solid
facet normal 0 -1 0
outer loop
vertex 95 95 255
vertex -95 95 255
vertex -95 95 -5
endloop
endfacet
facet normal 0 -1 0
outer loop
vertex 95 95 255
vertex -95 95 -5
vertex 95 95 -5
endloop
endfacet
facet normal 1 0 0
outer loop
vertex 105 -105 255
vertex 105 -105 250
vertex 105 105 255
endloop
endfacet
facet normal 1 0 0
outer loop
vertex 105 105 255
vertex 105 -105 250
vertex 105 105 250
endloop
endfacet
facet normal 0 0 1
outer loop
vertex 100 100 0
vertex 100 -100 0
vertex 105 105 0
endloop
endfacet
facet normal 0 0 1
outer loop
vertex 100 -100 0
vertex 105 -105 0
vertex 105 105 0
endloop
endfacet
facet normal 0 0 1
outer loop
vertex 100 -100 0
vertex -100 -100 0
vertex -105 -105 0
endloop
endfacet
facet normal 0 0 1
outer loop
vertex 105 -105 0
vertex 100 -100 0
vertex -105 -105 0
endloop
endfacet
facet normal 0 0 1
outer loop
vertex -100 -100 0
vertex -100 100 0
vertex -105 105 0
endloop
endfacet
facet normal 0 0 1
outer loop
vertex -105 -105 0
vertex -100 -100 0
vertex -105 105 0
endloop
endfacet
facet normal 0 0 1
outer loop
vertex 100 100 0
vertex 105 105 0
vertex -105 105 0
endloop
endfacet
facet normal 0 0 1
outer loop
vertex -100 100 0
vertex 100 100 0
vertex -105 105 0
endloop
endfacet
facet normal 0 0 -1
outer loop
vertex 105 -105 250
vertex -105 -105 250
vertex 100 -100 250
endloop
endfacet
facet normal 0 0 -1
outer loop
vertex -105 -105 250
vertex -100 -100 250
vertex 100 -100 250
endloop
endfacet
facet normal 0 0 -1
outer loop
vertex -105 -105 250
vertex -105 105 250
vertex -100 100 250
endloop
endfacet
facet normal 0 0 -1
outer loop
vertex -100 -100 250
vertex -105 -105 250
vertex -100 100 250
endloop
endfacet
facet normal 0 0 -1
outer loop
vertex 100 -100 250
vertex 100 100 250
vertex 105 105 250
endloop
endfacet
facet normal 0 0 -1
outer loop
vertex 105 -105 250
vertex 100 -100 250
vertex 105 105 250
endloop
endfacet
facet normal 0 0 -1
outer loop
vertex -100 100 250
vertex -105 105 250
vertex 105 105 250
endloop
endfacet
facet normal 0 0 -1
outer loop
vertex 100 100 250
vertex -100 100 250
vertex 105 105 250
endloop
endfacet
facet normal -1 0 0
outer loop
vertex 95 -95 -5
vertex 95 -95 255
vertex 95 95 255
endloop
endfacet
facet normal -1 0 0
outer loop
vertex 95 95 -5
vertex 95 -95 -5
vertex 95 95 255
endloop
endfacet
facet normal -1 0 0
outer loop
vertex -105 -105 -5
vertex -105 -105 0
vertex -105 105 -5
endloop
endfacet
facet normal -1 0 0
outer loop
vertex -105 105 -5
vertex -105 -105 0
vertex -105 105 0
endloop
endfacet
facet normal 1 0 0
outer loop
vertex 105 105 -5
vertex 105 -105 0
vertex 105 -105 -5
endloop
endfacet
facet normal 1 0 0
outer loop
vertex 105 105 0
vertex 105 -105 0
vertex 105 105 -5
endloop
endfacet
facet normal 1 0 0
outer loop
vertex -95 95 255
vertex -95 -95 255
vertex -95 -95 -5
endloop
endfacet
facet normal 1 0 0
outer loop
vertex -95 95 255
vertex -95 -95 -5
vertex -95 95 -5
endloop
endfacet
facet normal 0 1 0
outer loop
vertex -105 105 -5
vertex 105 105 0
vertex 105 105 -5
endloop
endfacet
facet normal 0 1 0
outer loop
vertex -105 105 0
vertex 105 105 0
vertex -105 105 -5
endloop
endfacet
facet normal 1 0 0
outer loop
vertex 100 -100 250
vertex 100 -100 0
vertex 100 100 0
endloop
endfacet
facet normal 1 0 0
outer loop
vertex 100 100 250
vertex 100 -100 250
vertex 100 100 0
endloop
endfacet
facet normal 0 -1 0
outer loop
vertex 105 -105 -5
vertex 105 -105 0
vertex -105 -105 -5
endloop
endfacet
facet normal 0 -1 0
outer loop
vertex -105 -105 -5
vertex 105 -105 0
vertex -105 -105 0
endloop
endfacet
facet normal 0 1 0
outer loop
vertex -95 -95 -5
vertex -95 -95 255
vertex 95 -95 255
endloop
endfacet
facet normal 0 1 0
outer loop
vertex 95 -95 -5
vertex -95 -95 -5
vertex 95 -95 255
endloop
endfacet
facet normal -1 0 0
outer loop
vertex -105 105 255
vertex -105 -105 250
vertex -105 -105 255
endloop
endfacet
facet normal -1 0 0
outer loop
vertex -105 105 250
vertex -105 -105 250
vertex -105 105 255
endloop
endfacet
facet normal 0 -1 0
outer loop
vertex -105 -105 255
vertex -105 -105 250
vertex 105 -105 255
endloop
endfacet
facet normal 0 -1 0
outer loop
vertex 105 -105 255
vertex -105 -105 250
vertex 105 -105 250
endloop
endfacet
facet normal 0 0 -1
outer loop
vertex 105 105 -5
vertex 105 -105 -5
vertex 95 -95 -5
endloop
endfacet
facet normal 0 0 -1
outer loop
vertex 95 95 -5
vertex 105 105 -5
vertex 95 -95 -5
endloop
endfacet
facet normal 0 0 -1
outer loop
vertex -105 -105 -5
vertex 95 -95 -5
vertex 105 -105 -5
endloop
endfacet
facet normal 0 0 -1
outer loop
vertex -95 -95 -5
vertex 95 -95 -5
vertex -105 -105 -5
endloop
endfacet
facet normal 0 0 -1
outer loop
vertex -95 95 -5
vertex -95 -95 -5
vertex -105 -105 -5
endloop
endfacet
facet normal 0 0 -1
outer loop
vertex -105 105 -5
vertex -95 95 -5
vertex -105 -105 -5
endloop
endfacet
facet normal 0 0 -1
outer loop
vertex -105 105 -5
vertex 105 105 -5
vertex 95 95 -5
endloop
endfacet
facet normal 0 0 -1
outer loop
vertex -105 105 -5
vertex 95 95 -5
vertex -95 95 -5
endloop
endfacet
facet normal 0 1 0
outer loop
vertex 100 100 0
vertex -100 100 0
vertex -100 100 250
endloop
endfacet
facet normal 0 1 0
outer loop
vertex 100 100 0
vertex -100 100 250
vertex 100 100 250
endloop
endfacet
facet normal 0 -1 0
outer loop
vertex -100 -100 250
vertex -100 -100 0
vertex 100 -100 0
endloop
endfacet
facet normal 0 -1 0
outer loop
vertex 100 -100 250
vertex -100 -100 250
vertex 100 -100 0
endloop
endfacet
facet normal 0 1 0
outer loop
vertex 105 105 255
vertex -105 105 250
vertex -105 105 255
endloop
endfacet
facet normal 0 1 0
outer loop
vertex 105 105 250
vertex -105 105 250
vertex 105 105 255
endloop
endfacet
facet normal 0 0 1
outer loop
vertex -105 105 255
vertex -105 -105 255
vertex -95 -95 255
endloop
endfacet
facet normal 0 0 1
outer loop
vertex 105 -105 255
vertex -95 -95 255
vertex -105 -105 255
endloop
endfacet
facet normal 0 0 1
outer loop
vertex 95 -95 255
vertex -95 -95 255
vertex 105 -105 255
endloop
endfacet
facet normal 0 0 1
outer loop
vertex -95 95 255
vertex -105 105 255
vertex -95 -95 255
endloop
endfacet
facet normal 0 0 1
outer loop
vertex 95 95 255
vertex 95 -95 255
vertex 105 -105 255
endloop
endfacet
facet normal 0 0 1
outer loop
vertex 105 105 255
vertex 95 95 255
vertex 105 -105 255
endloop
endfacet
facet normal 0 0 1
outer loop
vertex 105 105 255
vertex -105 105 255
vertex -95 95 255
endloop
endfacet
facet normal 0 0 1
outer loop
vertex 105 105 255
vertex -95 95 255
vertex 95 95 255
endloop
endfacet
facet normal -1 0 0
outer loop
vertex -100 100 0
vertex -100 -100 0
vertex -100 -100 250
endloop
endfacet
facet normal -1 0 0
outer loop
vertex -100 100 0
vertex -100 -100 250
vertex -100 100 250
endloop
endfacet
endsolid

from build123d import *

# Parameters (mm, degrees)
SKETCH1_W           = 200
SKETCH1_H           = 200
BOSS_EXTRUDE1_DEPTH = 250
SKETCH2_W           = 210
SKETCH2_H           = 210
BOSS_EXTRUDE2_DEPTH = 5
SKETCH3_W           = 210
SKETCH3_H           = 210
BOSS_EXTRUDE3_DEPTH = 5
SKETCH4_W           = 190
SKETCH4_H           = 190
CUT_EXTRUDE1_DEPTH  = 300.416098432


with BuildPart() as part:
    # Sketch1 → Boss-Extrude1 (new body)
    with BuildSketch(Plane.XY):
        Rectangle(SKETCH1_W, SKETCH1_H)
    extrude(amount=BOSS_EXTRUDE1_DEPTH)

    # Sketch2 → Boss-Extrude2 (add)
    with BuildSketch(Plane.XY.offset(250)):
        Rectangle(SKETCH2_W, SKETCH2_H)
    extrude(amount=BOSS_EXTRUDE2_DEPTH)

    # Sketch3 → Boss-Extrude3 (add)
    with BuildSketch(Plane(origin=(0, 0, 0), x_dir=(-1, 0, 0), z_dir=(0, 0, -1))):
        Rectangle(SKETCH3_W, SKETCH3_H)
    extrude(amount=BOSS_EXTRUDE3_DEPTH)

    # Sketch4 → Cut-Extrude1 (cut, through all)
    with BuildSketch(Plane.XY.offset(255)):
        Rectangle(SKETCH4_W, SKETCH4_H)
    extrude(amount=-CUT_EXTRUDE1_DEPTH, mode=Mode.SUBTRACT)


solid = part.part
